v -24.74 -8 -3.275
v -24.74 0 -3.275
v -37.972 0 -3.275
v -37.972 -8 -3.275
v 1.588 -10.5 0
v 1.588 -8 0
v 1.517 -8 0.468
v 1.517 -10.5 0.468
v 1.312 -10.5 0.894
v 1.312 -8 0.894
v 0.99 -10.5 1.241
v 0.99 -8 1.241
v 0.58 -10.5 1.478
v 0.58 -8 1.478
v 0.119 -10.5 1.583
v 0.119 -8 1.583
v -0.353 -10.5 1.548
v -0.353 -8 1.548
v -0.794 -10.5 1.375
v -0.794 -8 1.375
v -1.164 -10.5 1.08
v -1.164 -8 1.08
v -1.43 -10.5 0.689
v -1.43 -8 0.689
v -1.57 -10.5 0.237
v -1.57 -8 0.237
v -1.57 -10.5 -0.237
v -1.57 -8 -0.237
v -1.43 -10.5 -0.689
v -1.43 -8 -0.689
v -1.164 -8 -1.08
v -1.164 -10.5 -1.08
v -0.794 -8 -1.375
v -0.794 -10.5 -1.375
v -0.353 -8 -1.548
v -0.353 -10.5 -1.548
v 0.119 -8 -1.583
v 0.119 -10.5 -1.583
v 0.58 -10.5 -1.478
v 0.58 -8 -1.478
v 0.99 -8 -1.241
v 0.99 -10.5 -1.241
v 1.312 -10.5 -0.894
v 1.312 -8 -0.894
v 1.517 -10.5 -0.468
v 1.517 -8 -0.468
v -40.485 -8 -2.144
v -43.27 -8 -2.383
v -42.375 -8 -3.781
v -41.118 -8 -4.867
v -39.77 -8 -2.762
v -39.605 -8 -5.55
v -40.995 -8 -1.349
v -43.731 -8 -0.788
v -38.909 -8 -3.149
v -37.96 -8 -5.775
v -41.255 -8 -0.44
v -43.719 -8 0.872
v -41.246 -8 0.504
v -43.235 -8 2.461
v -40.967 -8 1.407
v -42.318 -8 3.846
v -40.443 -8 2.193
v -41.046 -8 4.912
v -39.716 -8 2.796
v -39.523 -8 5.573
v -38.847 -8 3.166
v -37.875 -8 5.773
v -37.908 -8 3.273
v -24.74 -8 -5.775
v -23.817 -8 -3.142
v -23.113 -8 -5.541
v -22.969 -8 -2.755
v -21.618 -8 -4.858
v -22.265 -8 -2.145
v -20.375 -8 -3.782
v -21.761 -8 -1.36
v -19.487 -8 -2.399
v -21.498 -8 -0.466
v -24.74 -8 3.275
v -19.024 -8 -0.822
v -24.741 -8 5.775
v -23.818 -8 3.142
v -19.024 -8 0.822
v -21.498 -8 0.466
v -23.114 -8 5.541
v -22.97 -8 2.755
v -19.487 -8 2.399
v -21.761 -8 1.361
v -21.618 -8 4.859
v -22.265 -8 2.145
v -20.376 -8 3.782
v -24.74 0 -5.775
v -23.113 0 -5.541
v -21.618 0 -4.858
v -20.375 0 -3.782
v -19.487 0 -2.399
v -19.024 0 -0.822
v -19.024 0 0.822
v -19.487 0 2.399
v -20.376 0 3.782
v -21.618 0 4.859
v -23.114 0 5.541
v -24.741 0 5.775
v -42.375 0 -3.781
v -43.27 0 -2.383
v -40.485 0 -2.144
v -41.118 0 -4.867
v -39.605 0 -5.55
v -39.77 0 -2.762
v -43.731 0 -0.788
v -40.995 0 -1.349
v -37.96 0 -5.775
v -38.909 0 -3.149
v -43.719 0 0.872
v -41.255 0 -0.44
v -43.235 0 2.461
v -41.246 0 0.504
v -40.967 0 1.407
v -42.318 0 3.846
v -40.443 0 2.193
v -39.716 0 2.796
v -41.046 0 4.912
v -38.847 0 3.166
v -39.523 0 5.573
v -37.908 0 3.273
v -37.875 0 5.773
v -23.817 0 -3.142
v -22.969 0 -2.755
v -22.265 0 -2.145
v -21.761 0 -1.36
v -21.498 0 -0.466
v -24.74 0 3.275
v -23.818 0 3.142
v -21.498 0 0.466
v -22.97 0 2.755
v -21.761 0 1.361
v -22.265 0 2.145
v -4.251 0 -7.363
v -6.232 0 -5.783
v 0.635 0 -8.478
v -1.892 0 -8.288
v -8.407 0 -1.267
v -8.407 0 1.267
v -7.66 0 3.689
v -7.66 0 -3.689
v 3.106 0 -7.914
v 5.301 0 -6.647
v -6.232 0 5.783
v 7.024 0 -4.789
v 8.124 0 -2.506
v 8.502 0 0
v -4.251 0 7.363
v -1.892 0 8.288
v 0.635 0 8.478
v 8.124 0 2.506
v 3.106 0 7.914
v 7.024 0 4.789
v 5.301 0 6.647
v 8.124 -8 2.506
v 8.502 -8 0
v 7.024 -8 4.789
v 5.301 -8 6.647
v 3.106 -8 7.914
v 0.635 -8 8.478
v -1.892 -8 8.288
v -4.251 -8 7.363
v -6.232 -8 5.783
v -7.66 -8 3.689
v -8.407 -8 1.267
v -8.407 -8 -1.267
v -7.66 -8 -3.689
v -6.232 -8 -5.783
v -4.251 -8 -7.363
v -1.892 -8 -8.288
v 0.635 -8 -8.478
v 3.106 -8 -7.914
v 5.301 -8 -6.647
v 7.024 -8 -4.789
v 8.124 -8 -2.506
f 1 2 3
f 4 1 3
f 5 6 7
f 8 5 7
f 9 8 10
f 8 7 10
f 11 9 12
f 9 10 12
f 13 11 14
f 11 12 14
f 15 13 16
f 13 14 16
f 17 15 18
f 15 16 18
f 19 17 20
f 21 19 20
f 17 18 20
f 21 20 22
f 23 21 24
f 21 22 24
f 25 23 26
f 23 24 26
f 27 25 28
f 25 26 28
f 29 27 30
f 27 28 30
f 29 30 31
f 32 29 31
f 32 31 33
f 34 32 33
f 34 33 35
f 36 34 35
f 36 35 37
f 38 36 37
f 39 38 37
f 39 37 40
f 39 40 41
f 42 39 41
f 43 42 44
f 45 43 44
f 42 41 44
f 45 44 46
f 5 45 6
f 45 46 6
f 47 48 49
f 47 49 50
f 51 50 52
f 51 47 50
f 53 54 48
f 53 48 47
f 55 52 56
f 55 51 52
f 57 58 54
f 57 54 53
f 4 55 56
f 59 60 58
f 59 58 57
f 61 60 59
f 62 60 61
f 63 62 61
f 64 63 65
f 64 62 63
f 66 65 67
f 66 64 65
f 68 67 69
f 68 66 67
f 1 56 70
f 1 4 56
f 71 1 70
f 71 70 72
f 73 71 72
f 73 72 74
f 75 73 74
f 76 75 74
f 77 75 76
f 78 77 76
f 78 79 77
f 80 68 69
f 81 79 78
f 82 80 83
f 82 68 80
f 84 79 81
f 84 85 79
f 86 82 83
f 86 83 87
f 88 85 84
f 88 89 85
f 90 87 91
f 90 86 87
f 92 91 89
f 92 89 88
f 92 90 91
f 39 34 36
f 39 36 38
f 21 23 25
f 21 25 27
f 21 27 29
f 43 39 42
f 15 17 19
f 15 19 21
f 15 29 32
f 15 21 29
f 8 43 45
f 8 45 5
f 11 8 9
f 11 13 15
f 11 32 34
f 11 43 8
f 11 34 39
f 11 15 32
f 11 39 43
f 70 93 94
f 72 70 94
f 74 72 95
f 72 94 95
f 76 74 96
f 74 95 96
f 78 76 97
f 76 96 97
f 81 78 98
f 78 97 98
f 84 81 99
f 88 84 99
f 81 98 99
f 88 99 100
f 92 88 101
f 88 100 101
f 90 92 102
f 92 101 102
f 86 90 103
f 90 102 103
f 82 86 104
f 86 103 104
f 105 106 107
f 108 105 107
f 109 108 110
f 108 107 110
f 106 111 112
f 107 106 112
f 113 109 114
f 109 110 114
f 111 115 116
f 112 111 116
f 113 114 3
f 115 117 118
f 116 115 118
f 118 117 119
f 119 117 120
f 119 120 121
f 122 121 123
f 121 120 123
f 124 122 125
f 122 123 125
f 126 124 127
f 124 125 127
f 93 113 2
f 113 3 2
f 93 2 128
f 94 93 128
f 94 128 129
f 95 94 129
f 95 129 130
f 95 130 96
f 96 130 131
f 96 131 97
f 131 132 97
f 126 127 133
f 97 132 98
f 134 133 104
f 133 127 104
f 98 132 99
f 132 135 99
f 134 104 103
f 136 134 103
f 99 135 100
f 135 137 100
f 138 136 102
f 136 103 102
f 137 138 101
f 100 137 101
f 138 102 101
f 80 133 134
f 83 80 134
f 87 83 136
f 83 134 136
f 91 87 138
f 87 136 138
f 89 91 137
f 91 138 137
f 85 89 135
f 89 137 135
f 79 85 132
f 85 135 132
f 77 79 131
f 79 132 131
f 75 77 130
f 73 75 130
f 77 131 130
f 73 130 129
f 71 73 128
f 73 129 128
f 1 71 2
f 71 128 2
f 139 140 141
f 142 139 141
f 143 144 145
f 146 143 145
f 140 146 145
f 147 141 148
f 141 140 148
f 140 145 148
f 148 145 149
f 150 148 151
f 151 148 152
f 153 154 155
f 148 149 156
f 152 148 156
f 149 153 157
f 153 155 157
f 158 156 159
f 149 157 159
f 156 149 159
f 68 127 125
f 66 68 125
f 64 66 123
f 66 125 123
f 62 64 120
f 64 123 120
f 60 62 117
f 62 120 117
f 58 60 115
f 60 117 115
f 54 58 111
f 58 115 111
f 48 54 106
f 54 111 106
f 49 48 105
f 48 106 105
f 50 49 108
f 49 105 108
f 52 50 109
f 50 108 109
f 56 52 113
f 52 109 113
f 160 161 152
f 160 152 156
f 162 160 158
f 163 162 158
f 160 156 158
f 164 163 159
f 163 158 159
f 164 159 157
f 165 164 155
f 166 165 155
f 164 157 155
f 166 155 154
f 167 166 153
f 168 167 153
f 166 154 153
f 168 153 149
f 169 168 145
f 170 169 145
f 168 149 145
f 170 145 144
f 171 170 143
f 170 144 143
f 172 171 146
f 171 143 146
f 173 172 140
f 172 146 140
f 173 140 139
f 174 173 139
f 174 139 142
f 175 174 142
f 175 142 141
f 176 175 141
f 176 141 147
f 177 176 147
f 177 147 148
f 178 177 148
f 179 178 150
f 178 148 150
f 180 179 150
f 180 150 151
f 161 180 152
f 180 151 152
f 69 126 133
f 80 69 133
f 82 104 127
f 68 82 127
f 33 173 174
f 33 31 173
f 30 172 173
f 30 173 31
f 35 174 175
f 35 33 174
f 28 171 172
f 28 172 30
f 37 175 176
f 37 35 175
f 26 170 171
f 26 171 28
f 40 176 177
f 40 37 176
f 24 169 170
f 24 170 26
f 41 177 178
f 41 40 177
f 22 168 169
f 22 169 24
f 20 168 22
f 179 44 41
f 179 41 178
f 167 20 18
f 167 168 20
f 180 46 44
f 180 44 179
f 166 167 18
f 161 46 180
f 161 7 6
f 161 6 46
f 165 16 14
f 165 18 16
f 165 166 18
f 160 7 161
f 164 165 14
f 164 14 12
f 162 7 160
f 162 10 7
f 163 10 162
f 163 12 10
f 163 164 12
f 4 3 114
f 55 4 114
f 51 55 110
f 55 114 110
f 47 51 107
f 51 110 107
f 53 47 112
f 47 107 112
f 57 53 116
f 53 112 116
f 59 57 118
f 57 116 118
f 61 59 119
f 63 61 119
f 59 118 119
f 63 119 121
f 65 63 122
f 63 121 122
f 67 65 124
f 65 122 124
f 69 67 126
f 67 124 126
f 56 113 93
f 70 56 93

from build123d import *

# Parameters (mm, degrees)
F0_R     = 8.501603
F1_DEPTH = 8
F2_R     = 1.5875
F3_DEPTH = 2.5
F5_DEPTH = 8


with BuildPart() as f1:
    # F0 (on Front) → F1 (new body)
    with BuildSketch(Plane.XZ):
        Circle(F0_R)
    extrude(amount=F1_DEPTH)

    # F2 (on face) → F3 (join)
    with BuildSketch(Plane.XZ.offset(8)):
        Circle(F2_R)
    extrude(amount=F3_DEPTH)


with BuildPart() as f5:
    # F4 (on Front) → F5 (new body)
    with BuildSketch(Plane.XZ):
        with BuildLine():
            ThreePointArc((-37.874664, 5.773413), (-43.784869, 0.042682), (-37.960018, -5.774783))
            Line((-37.960018, -5.774783), (-24.740121, -5.775))
            ThreePointArc((-24.740121, -5.775), (-18.965026, 0.000302), (-24.740724, 5.775))
            Line((-24.740724, 5.775), (-37.874664, 5.773413))
        make_face()
        with BuildLine():
            ThreePointArc((-37.97235, -3.274783), (-41.284868, 0.032199), (-37.907966, 3.273409))
            Line((-37.907966, 3.273409), (-24.740422, 3.275))
            ThreePointArc((-24.740422, 3.275), (-21.465026, 0.000171), (-24.74008, -3.275))
            Line((-24.74008, -3.275), (-37.97235, -3.274783))
        make_face(mode=Mode.SUBTRACT)
    extrude(amount=F5_DEPTH)


solid = Compound([f1.part, f5.part])
